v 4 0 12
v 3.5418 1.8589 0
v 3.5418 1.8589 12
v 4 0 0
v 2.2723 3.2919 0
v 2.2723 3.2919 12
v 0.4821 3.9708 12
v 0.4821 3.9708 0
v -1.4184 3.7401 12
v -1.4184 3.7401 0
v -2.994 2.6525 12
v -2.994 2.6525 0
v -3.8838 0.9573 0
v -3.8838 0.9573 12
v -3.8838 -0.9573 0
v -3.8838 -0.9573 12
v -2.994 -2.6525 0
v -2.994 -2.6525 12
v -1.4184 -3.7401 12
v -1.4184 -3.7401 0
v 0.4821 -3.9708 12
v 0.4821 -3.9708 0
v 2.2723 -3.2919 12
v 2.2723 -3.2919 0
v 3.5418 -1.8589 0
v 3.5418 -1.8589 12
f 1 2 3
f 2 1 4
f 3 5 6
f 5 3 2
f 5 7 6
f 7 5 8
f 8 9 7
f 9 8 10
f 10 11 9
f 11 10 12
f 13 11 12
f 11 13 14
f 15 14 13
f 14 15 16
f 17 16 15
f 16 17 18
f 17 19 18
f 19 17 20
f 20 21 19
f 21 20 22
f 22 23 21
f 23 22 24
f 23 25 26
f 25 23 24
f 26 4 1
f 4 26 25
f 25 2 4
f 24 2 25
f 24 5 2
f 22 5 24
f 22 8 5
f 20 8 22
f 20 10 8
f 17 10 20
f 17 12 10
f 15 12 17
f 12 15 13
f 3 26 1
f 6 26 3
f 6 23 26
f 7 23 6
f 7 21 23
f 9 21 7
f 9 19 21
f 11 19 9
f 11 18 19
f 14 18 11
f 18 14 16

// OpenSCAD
// === CYLINDER PARAMETERS ===
cylinder_diameter = 8;
cylinder_height = 12;

translate([0, 0, 0])
cylinder(h = cylinder_height, d = cylinder_diameter);
